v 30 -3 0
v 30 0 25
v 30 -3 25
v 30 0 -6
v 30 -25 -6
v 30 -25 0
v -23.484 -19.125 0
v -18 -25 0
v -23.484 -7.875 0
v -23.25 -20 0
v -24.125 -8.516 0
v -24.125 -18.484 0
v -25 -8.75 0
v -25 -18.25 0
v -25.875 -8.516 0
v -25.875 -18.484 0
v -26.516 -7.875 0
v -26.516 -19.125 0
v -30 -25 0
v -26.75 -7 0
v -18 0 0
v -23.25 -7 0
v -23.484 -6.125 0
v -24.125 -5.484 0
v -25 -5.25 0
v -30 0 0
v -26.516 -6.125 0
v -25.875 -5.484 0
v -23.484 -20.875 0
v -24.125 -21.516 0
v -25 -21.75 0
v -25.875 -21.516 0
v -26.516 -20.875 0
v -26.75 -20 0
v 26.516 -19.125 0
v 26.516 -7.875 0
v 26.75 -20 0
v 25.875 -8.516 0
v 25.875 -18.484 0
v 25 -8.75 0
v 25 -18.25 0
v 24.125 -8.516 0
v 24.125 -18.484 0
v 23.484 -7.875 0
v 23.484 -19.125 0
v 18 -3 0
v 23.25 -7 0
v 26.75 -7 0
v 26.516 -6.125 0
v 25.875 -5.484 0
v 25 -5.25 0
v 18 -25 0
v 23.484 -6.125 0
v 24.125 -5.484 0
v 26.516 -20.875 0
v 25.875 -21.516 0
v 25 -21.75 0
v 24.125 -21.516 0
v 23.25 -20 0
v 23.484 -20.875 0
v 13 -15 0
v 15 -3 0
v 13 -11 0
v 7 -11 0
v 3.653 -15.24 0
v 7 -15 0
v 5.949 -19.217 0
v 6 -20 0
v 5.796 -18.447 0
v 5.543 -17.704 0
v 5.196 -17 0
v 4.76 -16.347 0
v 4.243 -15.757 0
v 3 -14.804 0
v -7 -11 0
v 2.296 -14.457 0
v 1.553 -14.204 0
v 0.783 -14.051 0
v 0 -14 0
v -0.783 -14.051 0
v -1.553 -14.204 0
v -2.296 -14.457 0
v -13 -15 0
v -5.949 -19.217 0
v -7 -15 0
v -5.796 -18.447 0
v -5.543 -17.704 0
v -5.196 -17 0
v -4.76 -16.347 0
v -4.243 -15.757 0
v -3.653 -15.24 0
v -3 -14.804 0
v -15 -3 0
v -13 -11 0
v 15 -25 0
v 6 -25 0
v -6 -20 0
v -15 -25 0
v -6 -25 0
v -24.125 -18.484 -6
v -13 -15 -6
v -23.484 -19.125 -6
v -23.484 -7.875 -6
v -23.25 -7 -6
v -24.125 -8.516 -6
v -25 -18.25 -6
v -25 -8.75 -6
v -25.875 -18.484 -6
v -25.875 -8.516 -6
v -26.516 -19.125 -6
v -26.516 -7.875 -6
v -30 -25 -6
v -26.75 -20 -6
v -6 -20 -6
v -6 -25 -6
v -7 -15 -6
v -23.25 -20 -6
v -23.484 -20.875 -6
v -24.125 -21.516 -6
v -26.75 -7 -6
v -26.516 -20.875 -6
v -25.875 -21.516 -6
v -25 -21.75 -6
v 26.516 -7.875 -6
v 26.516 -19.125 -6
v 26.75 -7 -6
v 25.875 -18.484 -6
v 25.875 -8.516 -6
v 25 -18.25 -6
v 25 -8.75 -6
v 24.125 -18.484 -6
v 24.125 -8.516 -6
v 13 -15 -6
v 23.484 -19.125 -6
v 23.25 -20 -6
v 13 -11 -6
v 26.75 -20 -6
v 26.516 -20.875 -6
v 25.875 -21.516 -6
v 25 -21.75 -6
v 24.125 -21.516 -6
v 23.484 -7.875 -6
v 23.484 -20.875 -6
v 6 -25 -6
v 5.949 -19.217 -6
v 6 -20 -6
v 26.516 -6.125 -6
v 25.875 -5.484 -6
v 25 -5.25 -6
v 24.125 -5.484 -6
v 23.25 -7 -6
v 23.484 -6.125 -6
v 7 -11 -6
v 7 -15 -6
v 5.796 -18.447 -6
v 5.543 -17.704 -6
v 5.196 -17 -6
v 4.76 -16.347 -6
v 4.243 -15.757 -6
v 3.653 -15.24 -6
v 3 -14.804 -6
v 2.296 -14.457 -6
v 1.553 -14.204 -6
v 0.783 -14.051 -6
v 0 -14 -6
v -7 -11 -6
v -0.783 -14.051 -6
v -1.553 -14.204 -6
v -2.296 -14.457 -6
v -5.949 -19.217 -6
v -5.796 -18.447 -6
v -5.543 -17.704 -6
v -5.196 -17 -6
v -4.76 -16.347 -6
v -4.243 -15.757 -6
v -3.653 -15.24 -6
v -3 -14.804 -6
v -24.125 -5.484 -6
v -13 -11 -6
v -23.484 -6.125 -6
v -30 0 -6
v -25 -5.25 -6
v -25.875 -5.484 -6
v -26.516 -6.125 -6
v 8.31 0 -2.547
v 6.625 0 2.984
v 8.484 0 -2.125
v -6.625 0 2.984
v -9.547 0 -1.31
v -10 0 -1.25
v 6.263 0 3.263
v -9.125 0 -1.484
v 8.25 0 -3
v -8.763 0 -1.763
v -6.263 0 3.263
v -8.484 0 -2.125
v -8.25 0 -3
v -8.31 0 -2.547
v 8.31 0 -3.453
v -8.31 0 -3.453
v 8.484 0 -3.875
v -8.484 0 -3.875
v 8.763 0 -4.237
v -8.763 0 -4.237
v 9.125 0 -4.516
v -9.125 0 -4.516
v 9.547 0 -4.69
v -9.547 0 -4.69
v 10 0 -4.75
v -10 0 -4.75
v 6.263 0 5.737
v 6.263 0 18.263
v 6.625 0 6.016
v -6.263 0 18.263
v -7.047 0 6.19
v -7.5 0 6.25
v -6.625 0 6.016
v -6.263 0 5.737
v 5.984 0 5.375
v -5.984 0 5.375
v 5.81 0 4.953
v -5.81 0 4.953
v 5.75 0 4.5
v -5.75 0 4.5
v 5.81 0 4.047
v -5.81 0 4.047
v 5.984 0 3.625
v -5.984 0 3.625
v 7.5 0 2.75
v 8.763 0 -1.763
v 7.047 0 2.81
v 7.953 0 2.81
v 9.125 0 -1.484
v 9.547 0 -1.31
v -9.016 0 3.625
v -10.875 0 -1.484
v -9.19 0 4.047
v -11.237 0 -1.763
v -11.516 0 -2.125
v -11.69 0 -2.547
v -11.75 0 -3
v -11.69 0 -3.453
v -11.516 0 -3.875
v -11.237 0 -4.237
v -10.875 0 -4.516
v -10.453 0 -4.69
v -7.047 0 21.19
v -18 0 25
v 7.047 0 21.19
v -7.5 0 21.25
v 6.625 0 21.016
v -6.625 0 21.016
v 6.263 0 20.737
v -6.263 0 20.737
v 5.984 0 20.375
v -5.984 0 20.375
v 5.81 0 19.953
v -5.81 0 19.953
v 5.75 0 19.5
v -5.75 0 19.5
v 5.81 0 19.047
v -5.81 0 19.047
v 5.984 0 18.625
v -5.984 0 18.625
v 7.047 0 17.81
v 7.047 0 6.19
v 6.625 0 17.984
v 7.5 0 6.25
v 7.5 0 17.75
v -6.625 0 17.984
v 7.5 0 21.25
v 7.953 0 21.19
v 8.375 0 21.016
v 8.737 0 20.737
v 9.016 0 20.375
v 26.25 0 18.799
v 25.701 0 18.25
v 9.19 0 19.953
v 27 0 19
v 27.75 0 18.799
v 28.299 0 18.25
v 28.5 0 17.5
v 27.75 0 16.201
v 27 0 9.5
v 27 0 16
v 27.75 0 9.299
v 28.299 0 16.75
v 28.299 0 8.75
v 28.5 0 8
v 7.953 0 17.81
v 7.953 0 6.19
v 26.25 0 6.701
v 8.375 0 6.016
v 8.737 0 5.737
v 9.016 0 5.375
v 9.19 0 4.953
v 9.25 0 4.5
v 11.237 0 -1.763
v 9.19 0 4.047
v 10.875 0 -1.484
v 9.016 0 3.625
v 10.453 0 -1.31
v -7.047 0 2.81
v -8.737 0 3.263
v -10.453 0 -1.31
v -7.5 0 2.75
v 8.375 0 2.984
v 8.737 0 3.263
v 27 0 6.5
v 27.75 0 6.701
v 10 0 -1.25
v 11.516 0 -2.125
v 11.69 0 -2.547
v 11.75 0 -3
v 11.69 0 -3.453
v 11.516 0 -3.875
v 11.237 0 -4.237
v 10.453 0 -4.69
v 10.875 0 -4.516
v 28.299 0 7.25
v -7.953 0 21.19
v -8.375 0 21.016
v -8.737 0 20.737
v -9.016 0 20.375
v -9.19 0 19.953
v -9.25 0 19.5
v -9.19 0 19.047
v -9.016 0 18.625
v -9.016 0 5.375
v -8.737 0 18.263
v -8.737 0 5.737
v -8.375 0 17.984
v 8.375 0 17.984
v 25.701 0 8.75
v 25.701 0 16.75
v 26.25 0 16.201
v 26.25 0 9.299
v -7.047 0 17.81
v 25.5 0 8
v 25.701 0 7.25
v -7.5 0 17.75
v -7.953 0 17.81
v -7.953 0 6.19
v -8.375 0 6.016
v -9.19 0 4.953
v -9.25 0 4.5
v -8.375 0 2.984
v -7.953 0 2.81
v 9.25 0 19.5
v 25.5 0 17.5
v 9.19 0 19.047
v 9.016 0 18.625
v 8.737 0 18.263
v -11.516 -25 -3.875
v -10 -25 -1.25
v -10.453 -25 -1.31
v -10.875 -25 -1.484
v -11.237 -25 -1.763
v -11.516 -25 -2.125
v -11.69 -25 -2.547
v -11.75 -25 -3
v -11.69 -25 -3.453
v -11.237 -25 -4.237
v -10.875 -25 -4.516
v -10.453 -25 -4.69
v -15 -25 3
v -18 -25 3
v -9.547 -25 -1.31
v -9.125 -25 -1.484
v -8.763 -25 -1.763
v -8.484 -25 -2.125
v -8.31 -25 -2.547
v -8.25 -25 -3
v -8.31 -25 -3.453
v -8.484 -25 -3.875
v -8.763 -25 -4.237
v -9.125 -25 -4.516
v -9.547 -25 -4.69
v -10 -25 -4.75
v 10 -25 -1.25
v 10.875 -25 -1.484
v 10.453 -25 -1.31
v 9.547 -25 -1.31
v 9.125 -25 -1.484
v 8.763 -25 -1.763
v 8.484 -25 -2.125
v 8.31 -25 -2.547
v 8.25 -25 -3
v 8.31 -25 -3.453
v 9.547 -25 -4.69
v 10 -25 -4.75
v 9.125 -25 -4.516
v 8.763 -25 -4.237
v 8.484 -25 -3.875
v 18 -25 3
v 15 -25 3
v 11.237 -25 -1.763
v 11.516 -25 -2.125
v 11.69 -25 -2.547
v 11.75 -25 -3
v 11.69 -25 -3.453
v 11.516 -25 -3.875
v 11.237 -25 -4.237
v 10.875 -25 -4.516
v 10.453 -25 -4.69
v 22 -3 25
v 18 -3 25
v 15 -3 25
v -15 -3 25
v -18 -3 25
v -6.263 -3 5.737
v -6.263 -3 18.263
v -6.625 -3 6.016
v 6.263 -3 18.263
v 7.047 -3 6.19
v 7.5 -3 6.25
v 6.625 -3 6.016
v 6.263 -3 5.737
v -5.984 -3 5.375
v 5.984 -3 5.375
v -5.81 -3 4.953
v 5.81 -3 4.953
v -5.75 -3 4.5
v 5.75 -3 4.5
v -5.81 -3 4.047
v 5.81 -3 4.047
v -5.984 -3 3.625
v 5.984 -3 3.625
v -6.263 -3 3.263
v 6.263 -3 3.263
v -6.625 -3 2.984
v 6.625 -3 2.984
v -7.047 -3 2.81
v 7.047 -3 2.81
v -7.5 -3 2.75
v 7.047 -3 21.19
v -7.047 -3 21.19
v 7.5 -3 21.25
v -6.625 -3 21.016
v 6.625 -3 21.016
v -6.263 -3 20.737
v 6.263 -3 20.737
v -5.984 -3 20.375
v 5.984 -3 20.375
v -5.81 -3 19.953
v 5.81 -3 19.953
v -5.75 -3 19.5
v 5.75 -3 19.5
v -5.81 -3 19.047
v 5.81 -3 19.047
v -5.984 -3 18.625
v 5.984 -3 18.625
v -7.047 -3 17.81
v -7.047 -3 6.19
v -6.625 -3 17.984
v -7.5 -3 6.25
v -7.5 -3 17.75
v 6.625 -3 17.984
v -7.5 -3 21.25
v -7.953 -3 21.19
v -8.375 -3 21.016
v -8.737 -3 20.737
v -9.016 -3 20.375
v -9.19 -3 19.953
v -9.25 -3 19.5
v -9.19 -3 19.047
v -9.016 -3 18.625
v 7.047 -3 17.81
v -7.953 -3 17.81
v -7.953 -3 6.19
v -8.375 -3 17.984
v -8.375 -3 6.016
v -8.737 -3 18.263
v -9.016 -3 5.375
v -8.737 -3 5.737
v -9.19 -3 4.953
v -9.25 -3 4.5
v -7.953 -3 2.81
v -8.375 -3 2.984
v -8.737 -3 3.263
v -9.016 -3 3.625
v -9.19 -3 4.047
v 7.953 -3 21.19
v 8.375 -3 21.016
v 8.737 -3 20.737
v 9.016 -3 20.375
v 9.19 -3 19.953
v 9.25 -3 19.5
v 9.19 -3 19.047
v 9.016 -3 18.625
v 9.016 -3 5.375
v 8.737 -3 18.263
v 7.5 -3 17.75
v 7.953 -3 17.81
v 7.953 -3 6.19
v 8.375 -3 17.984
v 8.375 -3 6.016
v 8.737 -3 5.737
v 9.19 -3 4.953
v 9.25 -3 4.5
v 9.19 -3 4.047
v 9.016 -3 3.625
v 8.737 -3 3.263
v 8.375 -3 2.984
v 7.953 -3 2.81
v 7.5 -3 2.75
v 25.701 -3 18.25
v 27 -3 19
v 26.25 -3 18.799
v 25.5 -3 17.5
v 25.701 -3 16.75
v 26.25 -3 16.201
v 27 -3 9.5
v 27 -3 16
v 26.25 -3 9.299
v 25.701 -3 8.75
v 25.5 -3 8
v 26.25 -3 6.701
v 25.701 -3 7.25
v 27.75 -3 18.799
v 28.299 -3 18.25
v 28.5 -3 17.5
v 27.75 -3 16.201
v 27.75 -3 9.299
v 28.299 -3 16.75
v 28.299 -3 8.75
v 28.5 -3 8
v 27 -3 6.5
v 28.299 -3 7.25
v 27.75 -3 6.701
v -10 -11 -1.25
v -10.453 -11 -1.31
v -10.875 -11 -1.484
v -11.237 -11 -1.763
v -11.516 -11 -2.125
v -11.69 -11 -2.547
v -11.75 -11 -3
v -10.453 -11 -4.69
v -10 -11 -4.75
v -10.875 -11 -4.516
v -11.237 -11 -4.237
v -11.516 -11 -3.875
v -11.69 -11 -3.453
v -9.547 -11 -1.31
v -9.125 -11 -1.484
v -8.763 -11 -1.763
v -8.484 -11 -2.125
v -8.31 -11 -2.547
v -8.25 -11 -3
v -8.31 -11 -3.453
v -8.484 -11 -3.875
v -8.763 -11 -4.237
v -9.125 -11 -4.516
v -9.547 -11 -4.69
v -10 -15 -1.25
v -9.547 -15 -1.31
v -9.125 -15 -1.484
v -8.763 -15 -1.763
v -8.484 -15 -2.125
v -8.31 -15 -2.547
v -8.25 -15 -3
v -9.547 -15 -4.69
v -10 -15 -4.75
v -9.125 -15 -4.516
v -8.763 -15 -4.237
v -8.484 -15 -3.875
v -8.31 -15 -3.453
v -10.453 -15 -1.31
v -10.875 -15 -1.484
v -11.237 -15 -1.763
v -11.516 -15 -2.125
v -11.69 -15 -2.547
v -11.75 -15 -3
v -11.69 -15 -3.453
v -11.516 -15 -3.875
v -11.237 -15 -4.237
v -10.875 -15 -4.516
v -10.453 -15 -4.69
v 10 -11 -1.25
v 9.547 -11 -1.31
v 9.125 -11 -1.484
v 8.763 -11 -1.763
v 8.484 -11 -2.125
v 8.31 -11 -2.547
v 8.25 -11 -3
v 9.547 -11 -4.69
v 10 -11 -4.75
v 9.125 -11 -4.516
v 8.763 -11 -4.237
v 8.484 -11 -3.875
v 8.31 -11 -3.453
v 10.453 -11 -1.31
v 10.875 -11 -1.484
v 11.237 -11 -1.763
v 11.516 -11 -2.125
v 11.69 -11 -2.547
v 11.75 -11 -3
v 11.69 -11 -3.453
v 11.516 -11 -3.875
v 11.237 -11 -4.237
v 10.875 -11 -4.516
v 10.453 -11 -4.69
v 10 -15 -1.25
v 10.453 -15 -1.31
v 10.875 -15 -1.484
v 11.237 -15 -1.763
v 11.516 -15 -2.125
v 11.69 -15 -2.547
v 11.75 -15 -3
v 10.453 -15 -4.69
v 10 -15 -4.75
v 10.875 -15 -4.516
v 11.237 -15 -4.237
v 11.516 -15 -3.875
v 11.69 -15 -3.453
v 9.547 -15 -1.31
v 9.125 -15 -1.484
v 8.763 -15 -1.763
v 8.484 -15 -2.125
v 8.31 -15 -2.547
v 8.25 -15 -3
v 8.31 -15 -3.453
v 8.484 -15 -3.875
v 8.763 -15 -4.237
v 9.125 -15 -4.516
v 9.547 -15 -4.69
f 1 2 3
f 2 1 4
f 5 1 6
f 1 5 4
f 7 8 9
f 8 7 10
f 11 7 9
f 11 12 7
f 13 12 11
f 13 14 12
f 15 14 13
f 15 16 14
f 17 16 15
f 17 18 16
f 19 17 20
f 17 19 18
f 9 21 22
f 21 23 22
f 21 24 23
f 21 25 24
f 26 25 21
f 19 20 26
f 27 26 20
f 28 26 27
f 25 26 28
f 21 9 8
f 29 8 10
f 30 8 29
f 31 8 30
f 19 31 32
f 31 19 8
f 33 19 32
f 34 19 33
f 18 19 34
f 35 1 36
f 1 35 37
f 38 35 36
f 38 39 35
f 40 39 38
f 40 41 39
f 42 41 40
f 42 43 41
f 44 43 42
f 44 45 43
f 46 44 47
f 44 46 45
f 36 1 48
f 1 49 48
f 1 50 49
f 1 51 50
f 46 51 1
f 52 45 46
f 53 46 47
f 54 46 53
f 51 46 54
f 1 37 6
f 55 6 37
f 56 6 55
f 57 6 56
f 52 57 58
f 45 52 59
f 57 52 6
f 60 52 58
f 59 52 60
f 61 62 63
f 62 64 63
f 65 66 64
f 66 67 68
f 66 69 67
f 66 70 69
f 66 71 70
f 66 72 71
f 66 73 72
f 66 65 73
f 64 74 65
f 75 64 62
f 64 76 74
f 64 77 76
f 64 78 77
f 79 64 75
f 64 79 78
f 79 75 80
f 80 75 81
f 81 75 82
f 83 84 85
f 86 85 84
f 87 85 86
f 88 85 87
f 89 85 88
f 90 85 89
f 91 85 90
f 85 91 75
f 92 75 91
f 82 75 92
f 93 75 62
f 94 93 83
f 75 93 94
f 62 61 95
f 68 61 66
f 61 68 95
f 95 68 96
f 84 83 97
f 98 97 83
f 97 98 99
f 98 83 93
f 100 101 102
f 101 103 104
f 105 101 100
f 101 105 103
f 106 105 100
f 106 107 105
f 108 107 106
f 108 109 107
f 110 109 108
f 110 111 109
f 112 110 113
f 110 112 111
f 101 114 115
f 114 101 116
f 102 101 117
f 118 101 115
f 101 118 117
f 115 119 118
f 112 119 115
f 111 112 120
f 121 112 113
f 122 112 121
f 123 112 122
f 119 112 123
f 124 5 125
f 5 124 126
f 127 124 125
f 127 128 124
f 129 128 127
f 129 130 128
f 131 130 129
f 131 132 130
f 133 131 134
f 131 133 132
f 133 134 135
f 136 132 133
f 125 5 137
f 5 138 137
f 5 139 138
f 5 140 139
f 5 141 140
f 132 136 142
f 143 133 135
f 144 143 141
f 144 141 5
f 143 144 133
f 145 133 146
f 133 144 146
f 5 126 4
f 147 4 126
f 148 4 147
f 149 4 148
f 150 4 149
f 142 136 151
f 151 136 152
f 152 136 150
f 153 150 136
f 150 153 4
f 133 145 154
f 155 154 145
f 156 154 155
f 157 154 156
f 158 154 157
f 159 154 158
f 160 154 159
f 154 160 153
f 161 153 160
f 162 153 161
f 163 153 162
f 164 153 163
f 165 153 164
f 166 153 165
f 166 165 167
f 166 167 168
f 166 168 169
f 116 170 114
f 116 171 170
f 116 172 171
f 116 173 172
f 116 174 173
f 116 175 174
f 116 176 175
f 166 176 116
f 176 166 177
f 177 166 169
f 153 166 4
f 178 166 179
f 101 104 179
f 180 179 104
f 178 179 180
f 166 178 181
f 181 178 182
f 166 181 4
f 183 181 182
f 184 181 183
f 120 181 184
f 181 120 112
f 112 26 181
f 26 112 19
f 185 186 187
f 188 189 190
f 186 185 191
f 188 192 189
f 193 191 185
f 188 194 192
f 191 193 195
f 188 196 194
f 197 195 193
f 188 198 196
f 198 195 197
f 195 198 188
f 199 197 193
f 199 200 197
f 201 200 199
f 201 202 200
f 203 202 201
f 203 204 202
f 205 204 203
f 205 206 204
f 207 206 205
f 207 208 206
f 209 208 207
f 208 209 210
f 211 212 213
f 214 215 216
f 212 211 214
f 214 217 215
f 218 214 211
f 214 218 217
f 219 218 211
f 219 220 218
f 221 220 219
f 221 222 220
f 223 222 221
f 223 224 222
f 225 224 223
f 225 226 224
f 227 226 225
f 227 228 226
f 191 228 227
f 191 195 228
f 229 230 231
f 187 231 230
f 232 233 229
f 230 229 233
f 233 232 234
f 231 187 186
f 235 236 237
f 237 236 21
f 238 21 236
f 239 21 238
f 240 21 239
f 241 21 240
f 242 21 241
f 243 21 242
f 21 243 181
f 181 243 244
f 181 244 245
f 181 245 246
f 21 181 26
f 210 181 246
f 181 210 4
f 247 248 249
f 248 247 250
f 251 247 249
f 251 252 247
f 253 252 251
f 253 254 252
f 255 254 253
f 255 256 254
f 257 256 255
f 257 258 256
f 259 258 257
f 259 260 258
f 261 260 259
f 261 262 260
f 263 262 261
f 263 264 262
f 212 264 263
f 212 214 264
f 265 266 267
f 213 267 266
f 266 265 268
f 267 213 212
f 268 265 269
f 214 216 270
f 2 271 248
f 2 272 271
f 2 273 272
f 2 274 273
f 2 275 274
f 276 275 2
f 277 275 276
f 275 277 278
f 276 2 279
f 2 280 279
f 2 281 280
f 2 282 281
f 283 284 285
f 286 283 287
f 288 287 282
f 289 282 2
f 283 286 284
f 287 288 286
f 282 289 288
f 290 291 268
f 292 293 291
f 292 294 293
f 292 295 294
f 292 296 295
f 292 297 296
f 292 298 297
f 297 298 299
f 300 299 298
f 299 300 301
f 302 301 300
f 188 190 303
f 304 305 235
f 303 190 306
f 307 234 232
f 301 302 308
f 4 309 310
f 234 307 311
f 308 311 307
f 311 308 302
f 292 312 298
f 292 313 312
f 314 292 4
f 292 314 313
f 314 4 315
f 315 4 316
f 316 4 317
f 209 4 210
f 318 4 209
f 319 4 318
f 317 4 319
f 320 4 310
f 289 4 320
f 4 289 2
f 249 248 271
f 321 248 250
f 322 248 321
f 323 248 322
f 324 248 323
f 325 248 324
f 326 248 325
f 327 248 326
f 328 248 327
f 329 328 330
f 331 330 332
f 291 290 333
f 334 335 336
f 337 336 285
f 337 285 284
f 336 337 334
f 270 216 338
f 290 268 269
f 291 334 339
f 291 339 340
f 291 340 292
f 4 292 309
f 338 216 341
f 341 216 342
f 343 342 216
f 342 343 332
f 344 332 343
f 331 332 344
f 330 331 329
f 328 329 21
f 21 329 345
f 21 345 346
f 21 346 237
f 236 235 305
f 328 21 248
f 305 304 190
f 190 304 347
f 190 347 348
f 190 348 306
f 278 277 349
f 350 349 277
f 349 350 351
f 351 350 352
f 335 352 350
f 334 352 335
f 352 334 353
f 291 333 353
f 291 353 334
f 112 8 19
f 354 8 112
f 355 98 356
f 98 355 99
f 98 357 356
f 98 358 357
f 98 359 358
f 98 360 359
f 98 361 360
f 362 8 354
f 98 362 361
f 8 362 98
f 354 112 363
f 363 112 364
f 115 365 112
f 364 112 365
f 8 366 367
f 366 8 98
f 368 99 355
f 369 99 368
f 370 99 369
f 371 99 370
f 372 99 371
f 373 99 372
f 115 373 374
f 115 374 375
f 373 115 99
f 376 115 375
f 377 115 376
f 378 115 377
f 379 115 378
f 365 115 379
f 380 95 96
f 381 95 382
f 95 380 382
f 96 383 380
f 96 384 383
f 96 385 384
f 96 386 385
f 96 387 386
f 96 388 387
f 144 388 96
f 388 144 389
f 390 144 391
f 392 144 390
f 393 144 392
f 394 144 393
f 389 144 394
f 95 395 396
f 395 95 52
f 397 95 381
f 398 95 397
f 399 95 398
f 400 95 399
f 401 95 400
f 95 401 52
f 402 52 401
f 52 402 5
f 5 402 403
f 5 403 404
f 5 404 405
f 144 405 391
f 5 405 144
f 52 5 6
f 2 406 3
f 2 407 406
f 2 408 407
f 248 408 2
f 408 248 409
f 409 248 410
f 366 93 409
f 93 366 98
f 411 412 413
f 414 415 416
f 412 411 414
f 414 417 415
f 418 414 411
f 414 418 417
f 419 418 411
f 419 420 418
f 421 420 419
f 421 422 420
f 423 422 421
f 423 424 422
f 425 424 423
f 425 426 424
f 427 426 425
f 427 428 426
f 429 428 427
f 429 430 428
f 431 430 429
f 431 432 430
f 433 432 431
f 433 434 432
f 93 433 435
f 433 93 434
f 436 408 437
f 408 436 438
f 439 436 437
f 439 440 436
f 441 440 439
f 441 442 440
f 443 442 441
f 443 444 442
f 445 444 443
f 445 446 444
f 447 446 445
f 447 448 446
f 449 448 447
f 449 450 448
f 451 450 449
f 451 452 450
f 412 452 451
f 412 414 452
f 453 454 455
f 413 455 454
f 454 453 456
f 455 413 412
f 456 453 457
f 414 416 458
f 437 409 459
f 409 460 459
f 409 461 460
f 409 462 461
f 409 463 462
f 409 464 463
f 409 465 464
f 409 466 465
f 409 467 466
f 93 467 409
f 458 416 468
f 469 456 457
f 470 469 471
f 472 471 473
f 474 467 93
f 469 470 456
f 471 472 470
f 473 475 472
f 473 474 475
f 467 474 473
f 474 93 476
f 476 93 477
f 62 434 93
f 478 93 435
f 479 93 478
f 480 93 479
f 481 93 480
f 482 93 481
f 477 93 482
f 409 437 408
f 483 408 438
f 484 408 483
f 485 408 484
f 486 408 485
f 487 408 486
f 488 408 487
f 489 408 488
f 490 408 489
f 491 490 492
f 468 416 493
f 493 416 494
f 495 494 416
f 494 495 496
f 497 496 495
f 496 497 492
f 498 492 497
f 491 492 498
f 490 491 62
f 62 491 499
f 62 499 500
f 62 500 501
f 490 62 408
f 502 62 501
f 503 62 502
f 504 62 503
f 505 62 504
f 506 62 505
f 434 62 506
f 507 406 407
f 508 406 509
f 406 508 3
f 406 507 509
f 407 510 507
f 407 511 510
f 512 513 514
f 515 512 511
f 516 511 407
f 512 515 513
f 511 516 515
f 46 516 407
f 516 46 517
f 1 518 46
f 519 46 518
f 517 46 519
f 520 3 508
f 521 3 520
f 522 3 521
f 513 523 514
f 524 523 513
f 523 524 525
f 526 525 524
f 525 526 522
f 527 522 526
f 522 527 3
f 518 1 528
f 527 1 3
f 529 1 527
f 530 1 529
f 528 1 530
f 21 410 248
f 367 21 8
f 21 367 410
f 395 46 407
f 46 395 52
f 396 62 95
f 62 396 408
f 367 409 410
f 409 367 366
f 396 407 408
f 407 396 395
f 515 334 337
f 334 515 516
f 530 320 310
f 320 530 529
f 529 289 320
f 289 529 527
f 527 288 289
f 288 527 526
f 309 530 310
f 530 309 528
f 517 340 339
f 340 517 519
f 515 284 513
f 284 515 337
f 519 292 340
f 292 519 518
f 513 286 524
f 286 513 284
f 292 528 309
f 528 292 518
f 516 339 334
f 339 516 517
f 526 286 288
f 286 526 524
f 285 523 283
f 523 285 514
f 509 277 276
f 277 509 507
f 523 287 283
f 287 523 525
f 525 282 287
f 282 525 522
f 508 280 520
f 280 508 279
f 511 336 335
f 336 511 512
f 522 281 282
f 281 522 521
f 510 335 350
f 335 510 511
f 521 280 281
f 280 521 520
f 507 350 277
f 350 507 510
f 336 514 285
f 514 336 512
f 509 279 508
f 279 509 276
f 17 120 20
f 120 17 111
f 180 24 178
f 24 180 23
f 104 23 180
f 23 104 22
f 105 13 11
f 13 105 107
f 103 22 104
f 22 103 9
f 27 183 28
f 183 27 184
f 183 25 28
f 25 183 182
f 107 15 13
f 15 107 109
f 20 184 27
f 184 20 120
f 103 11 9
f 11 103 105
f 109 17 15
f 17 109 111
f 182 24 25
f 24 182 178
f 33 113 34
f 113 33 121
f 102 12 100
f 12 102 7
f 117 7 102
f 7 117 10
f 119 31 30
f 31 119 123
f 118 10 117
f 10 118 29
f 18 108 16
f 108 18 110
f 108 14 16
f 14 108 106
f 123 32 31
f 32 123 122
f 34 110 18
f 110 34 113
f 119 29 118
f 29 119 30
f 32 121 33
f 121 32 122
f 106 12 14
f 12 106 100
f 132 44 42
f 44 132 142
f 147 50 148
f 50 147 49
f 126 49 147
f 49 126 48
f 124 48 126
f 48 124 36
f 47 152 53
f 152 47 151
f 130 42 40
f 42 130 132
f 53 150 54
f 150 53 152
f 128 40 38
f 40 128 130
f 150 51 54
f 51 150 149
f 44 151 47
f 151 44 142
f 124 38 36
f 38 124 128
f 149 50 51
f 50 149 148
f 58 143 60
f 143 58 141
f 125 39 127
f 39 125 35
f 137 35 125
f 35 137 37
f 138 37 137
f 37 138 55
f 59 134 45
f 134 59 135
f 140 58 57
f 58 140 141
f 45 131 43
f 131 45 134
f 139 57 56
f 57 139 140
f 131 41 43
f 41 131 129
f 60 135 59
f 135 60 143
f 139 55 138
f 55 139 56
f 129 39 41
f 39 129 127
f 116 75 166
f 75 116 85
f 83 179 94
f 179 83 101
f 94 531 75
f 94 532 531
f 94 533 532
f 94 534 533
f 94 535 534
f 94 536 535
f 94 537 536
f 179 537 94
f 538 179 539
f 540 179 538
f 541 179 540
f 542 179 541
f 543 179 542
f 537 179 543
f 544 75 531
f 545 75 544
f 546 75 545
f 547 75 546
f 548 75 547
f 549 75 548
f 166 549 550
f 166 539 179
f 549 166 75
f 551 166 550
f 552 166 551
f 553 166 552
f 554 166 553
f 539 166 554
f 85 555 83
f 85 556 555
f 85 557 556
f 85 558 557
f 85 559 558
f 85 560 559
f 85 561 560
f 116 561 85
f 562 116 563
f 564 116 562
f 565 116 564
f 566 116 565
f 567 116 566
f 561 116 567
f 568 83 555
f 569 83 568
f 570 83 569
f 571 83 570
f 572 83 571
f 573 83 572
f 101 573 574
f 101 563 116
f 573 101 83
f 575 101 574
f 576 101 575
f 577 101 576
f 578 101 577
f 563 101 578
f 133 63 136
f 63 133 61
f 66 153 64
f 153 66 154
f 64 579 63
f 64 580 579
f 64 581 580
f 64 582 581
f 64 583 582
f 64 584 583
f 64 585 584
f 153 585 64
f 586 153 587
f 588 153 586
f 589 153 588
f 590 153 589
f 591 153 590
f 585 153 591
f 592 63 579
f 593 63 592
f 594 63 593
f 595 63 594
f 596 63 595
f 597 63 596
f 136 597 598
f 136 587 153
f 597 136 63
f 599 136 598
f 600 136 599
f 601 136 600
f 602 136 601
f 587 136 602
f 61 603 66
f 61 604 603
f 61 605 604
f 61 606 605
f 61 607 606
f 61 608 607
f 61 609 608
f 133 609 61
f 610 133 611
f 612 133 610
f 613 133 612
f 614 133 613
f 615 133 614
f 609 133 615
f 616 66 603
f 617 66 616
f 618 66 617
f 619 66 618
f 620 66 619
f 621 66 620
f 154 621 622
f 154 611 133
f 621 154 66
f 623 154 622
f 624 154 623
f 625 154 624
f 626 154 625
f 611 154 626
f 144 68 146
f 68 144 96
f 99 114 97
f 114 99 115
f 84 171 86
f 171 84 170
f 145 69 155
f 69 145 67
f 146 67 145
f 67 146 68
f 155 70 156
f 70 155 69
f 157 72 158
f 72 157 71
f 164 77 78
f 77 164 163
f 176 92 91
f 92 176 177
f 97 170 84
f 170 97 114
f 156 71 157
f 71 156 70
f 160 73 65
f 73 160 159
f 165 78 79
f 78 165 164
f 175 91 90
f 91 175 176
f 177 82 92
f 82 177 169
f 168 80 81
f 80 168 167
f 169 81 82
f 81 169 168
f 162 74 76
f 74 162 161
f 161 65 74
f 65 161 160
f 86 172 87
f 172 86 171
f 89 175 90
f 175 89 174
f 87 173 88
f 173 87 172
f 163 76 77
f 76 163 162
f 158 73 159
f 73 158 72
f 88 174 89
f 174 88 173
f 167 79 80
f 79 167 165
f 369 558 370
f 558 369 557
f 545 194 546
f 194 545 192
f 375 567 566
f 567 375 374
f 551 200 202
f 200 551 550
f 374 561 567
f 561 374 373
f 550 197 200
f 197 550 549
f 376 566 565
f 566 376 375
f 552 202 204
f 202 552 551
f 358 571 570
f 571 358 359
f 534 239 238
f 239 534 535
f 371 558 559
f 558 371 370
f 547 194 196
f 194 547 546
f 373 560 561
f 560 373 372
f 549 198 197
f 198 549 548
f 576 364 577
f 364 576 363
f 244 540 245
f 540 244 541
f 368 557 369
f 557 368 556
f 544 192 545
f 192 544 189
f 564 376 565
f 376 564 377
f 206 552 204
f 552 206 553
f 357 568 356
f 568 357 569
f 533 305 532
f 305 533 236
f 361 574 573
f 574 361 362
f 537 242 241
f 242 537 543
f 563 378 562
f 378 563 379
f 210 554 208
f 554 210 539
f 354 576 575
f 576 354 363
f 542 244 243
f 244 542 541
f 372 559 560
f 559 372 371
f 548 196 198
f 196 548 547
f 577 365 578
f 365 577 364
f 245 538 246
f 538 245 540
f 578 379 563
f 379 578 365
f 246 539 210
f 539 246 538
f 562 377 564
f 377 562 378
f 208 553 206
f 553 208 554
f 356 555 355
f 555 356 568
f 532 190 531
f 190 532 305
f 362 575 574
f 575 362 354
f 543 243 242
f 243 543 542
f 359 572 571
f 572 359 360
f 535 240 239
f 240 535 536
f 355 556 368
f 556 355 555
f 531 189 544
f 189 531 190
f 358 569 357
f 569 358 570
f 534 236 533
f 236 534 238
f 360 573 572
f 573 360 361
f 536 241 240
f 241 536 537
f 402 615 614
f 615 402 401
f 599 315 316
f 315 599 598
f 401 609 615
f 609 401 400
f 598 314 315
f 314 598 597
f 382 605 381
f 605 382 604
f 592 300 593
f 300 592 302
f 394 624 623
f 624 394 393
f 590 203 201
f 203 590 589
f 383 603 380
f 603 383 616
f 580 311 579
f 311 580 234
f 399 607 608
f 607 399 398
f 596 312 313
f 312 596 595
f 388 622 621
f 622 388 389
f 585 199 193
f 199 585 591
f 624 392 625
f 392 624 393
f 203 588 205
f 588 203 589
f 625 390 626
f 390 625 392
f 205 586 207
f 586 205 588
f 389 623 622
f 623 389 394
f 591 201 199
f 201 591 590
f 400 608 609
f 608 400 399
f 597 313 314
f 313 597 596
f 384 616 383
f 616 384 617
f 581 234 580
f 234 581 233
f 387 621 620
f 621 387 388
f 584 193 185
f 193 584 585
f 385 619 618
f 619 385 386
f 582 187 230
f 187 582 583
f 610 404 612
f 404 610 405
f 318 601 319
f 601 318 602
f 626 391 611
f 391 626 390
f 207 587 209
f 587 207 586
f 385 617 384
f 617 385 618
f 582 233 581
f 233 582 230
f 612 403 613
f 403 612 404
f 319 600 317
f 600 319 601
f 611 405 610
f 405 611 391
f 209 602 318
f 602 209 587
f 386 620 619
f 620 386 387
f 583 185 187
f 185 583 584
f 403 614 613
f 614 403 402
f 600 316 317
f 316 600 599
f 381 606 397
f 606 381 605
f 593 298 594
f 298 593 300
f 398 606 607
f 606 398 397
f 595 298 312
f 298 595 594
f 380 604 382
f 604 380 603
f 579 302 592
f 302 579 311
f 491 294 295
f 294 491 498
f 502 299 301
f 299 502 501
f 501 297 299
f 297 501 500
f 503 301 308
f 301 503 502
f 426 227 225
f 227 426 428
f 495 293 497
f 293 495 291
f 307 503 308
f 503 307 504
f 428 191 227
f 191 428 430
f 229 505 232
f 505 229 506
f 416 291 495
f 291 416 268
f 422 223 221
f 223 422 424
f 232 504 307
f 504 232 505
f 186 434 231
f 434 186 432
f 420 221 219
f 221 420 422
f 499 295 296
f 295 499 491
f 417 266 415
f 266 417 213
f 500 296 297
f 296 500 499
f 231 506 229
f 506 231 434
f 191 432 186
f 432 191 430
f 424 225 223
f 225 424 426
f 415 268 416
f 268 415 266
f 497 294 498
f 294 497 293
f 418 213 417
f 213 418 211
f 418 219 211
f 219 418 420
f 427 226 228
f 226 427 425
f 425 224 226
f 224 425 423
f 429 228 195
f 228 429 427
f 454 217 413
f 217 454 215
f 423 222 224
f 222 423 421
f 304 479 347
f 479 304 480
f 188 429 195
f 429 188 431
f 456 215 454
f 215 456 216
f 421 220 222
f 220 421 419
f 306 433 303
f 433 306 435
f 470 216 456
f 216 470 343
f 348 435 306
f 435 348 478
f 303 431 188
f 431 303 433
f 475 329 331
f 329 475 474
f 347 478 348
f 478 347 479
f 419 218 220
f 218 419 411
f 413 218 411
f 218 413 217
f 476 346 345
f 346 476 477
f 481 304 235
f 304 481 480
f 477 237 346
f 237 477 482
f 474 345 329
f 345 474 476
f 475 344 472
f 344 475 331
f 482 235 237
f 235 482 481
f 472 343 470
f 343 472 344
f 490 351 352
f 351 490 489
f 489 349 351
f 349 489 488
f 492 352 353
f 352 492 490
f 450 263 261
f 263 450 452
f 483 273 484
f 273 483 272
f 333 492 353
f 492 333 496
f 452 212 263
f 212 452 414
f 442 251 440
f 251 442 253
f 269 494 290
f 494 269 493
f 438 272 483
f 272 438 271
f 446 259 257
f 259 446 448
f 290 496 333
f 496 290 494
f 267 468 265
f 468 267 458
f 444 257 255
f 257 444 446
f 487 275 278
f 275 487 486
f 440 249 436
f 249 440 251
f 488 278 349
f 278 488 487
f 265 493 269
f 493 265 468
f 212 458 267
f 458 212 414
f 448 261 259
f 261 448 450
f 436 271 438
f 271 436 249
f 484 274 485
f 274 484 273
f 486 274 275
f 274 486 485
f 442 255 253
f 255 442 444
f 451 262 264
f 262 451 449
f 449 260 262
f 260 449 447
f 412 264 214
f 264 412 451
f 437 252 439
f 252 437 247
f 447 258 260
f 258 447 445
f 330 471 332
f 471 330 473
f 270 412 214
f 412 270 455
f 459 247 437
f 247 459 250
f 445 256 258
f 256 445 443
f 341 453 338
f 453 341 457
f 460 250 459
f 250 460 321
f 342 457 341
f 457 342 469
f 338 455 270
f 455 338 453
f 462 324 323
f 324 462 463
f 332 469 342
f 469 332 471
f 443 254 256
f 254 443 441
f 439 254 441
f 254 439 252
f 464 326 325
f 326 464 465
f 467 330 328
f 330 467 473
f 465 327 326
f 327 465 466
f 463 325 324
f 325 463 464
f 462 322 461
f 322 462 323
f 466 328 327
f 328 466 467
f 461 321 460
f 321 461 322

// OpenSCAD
difference()
{
    union()
    {
        translate([-15-10-5,-25,-6])
            cube([30+20+10,25,6]);
        
        translate([-15,-3,0])
            cube([30+10+5,3,25]);
        
        translate([-15-3,-25,0])
            cube([3,25,25]);
        translate([15,-25,0])
            cube([3,25,25]);
    }
    union()
    {
        translate([-15-3,-25,3])
            rotate([45,0,0])
                cube([40,40,40]);
        
        translate([25+2,-4,8])
            rotate([270,0,0])
                cylinder(d=3,h=20,$fn=12);
        translate([25+2,-4,8+9.5])
            rotate([270,0,0])
                cylinder(d=3,h=20,$fn=12);
        
        
        translate([-20-5,-7,-6])
            cylinder(d=3.5,h=6,$fn=12);
        translate([-20-5,-20,-6])
            cylinder(d=3.5,h=6,$fn=12);
        
        
        translate([20+5,-7,-6])
            cylinder(d=3.5,h=6,$fn=12);
        translate([20+5,-20,-6])
            cylinder(d=3.5,h=6,$fn=12);
        
        
        translate([-10-3,-15,-6])
            cube([6,4,6]);
        
        translate([10-3,-15,-6])
            cube([6,4,6]);
        
        translate([-6,-25,-6])
            cube([12,5,6]);
        
        translate([0,-20,-6])
            cylinder(d=12,h=6,$fn=48);
        
        translate([-10,-25,-3])
            rotate([270,0,0])
                cylinder(d=3.5,h=40,$fn=24);
        translate([10,-25,-3])
            rotate([270,0,0])
                cylinder(d=3.5,h=40,$fn=24);
        
        
        translate([7.5,-4,12-7.5])
            rotate([270,0,0])
                cylinder(d=3.5,h=20,$fn=24);
        translate([-7.5,-4,12-7.5])
            rotate([270,0,0])
                cylinder(d=3.5,h=20,$fn=24);
        translate([7.5,-4,12+7.5])
            rotate([270,0,0])
                cylinder(d=3.5,h=20,$fn=24);
        translate([-7.5,-4,12+7.5])
            rotate([270,0,0])
                cylinder(d=3.5,h=20,$fn=24);
    }
}
